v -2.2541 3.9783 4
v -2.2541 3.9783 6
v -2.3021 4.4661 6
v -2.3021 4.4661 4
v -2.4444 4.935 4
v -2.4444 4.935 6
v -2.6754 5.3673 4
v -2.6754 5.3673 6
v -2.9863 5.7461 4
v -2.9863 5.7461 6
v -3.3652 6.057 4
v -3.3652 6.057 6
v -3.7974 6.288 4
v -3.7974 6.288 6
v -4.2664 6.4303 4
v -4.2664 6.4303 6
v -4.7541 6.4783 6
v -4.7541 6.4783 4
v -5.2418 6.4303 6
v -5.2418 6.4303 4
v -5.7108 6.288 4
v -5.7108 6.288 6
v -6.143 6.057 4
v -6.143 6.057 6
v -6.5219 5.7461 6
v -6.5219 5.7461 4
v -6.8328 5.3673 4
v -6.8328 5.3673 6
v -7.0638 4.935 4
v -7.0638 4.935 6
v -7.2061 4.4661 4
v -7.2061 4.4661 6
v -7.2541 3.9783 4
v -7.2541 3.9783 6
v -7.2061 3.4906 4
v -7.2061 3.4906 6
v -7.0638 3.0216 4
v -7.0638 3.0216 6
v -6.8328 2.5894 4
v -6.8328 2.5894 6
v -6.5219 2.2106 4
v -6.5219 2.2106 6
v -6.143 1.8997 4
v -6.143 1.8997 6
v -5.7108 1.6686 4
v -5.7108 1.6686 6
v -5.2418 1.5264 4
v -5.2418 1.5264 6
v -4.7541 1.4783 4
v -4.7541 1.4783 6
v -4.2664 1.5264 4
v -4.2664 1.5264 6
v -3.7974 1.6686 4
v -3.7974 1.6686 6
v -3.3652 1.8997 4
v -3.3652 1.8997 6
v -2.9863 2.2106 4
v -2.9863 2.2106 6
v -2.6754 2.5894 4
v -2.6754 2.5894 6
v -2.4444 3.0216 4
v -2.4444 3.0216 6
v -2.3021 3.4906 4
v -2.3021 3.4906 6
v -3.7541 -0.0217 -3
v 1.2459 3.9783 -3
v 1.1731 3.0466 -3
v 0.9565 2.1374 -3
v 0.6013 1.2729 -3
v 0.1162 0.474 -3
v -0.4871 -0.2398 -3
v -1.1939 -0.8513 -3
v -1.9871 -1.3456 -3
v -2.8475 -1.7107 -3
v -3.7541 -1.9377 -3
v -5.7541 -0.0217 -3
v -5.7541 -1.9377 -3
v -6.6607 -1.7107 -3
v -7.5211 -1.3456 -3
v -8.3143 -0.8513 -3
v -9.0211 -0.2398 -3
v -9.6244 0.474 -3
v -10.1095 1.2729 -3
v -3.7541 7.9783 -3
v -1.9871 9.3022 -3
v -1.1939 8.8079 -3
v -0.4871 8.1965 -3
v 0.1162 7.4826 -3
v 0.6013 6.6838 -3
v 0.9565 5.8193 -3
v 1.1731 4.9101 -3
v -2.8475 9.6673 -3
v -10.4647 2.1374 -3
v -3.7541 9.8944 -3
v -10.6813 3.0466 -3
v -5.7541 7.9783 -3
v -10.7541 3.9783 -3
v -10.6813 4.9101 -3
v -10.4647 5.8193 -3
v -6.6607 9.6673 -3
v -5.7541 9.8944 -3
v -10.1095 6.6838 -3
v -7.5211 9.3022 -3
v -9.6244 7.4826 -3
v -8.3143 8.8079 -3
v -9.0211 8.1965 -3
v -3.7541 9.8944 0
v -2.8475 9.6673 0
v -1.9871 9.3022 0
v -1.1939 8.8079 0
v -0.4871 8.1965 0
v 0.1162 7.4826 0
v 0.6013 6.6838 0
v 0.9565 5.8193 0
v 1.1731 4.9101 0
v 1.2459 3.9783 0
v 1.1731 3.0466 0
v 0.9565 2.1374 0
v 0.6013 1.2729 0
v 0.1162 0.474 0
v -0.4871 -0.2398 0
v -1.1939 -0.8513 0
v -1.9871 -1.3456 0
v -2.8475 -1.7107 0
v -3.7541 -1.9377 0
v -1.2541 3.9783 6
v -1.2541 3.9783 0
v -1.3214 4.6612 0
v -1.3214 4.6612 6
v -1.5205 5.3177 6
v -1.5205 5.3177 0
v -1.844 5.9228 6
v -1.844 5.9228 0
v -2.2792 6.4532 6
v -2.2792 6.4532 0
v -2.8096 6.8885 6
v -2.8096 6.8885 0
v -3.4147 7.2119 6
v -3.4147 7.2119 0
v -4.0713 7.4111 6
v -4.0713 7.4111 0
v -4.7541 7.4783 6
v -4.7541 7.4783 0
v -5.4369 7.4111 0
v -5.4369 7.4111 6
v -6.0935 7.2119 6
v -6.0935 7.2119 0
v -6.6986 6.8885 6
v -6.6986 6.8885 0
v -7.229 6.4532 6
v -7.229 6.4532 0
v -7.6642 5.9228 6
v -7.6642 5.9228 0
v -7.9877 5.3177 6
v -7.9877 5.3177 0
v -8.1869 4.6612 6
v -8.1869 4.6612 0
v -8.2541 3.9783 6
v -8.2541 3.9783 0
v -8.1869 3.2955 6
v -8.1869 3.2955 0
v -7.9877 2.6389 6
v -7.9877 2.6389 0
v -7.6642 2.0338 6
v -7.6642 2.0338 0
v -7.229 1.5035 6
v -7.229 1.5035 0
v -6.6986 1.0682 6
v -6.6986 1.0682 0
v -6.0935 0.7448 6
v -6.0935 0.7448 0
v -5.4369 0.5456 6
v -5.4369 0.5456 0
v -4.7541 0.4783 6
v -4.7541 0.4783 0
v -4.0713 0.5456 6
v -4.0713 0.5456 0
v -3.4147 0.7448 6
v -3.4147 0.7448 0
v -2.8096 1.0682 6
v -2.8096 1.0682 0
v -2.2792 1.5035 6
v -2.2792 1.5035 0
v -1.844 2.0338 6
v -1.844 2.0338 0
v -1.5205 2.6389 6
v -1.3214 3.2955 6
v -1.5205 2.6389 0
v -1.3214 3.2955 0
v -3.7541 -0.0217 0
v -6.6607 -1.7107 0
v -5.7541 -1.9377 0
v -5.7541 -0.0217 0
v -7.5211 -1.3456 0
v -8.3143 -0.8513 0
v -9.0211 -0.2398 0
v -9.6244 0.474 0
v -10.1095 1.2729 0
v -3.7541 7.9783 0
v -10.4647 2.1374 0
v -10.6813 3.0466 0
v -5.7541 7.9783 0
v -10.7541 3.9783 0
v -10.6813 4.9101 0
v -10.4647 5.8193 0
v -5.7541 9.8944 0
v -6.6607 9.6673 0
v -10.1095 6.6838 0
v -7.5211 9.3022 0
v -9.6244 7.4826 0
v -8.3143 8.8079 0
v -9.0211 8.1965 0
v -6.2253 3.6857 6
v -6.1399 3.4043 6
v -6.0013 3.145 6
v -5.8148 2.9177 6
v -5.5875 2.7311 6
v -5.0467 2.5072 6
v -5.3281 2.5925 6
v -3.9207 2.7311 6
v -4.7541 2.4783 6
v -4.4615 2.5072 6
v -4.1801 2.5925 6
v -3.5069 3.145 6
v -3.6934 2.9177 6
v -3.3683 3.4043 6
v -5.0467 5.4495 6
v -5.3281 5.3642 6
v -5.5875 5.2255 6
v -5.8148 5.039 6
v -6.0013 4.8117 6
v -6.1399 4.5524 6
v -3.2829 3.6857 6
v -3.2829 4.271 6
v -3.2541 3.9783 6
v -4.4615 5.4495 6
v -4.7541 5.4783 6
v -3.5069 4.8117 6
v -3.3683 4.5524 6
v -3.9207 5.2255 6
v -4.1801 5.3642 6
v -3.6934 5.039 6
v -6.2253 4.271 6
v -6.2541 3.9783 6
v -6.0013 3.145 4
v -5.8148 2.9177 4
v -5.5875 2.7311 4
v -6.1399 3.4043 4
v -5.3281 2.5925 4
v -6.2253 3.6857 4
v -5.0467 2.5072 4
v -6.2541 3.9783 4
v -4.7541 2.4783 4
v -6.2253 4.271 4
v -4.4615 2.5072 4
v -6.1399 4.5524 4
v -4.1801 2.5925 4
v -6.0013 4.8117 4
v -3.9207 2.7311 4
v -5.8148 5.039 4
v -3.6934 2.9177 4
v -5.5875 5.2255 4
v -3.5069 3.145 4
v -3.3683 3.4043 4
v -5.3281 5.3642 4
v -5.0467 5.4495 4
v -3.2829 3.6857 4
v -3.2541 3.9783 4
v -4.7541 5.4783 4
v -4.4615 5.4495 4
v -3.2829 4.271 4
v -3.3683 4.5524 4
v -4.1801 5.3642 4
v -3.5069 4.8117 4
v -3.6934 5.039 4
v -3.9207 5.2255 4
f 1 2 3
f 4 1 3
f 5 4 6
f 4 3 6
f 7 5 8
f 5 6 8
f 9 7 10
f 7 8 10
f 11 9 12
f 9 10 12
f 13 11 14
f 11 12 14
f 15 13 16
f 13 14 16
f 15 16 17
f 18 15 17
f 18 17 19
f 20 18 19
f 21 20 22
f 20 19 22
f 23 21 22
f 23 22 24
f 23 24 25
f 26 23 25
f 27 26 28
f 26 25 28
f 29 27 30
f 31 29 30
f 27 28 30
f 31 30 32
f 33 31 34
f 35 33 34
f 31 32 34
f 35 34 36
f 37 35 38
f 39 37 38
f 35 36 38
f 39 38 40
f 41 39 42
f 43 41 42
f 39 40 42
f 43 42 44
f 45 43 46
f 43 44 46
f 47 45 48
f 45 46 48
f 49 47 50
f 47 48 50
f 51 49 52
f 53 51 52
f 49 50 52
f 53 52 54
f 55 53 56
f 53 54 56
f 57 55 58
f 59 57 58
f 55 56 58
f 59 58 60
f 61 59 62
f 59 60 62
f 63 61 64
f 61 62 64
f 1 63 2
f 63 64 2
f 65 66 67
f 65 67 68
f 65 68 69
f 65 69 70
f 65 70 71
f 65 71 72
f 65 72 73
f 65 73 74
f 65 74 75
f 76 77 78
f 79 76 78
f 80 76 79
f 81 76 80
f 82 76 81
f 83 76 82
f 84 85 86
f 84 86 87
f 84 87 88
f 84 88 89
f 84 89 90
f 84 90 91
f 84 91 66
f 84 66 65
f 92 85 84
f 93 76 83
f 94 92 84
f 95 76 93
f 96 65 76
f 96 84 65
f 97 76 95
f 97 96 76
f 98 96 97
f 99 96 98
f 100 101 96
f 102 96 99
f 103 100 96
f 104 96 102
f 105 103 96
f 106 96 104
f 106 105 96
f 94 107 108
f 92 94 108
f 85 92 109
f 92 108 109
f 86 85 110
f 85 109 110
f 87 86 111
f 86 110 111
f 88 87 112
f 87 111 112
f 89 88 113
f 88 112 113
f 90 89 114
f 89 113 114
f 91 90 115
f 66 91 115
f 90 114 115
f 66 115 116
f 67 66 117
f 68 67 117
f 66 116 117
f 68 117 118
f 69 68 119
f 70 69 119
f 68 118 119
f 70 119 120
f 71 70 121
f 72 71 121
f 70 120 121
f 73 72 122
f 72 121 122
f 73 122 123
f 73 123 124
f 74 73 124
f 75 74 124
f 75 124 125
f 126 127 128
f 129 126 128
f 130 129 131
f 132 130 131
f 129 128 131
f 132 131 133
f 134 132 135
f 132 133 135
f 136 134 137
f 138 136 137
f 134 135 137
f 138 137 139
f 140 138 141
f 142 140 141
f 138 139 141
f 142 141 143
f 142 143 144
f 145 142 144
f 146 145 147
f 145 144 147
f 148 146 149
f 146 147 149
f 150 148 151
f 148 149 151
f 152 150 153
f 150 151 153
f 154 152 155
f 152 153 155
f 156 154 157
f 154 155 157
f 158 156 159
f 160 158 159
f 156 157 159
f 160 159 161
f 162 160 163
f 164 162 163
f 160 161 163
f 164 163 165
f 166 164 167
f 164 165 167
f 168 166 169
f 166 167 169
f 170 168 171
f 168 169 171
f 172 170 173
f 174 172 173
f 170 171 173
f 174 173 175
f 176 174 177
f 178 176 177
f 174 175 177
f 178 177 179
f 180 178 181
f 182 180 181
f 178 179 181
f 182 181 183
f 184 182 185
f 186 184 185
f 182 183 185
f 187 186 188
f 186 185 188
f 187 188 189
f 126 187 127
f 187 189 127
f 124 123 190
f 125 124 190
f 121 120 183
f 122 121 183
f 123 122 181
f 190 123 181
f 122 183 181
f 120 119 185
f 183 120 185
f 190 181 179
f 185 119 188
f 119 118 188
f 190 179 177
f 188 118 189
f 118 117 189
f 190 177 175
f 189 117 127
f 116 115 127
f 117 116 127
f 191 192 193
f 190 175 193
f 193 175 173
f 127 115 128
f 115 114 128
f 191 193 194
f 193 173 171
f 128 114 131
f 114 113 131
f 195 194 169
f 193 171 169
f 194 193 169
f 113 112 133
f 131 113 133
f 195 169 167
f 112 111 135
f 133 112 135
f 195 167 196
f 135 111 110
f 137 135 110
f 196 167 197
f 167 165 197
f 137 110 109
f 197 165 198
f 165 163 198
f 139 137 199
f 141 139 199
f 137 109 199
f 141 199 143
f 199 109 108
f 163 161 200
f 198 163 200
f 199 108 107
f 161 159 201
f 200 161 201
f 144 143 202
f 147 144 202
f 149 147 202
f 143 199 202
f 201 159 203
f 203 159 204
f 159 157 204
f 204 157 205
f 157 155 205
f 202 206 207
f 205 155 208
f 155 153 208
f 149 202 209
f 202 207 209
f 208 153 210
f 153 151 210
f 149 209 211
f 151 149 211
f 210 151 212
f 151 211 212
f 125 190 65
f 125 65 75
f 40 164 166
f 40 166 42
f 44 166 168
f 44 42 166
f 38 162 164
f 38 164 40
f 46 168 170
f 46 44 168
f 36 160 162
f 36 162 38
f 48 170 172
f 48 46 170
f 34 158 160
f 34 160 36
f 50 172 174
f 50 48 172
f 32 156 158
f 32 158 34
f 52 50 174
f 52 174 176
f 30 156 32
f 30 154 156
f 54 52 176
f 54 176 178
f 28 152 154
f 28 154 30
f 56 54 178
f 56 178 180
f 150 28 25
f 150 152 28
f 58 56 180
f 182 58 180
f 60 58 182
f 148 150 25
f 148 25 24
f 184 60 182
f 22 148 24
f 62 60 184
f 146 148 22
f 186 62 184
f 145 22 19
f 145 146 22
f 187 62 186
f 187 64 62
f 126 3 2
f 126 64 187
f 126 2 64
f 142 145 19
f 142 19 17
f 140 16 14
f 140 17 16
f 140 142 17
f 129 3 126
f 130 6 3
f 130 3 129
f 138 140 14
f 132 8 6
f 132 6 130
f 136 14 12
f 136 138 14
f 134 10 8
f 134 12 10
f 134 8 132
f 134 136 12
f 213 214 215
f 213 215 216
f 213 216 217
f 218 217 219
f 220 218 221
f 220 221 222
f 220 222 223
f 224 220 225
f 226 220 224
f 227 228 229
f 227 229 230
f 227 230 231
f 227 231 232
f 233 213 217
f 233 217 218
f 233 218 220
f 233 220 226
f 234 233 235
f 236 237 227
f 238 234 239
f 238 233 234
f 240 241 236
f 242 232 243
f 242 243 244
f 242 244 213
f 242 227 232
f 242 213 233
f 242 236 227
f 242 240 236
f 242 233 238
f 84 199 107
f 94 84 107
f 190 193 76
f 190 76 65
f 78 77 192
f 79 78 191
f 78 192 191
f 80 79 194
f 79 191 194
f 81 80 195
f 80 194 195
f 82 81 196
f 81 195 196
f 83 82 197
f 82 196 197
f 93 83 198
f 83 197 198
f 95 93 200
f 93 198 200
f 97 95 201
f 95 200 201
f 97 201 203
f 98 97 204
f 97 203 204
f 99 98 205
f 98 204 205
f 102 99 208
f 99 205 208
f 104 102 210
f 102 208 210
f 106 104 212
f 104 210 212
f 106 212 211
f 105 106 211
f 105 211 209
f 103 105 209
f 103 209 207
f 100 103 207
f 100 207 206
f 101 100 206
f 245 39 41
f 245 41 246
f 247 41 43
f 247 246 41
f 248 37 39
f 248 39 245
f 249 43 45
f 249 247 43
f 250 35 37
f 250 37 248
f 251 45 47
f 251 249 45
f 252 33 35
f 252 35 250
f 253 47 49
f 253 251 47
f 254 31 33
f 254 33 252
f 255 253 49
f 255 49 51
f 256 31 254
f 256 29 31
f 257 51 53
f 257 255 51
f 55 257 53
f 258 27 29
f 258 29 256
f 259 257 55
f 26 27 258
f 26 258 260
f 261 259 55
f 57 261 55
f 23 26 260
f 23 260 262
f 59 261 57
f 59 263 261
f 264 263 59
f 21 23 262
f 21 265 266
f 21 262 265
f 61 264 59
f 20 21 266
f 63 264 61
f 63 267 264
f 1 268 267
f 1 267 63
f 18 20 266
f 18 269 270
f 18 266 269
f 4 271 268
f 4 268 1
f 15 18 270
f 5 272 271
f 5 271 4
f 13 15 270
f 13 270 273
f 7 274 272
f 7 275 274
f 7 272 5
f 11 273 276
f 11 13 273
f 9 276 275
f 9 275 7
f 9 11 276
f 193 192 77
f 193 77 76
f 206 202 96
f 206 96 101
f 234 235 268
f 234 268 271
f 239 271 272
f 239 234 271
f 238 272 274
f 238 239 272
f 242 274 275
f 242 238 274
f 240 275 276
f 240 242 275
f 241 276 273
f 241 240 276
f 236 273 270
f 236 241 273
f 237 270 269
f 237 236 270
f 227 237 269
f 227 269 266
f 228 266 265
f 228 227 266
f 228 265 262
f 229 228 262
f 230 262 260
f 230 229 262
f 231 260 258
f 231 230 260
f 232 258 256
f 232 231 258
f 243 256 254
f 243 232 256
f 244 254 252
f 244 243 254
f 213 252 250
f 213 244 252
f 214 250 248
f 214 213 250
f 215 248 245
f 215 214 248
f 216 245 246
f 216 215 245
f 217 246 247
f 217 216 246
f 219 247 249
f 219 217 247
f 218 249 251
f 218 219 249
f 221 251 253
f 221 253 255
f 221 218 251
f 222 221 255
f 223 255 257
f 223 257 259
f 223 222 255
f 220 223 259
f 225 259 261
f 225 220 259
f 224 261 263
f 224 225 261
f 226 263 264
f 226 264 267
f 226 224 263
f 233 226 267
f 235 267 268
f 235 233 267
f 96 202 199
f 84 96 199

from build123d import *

# Parameters (mm, degrees)
CROQUIS1_R              = 3.5
SALIENTE_EXTRUIR1_DEPTH = 6
CROQUIS2_R              = 6
SALIENTE_EXTRUIR2_DEPTH = 3
CROQUIS3_R              = 2.5
CROQUIS3_R_2            = 1.5
CORTAR_EXTRUIR1_DEPTH   = 2
CROQUIS4_W              = 2
CROQUIS4_H              = 2
CORTAR_EXTRUIR2_DEPTH   = 4


with BuildPart() as part:
    # Croquis1 → Saliente-Extruir1 (new body)
    with BuildSketch(Plane.XY):
        with Locations((-4.754102012, 3.97833761)):
            Circle(CROQUIS1_R)
    extrude(amount=SALIENTE_EXTRUIR1_DEPTH)

    # Croquis2 → Saliente-Extruir2 (add)
    with BuildSketch(Plane(origin=(0, 0, 0), x_dir=(-1, 0, 0), z_dir=(0, 0, -1))):
        with Locations((4.754102012, 3.97833761)):
            Circle(CROQUIS2_R)
    extrude(amount=SALIENTE_EXTRUIR2_DEPTH)

    # Croquis3 → Cortar-Extruir1 (cut)
    with BuildSketch(Plane.XY.offset(6)):
        with Locations((-4.754102012, 3.97833761)):
            Circle(CROQUIS3_R)
        with Locations((-4.754102012, 3.97833761)):
            Circle(CROQUIS3_R_2, mode=Mode.SUBTRACT)
    extrude(amount=-CORTAR_EXTRUIR1_DEPTH, mode=Mode.SUBTRACT)

    # Croquis4 → Cortar-Extruir2 (cut, through all)
    with BuildSketch(Plane.XY):
        with Locations((-4.754102012, 8.97833761)):
            Rectangle(CROQUIS4_W, CROQUIS4_H)
        Polygon((-5.754102012, -0.02166239), (-3.754102012, -0.02166239), (-3.754102012, -2.02166239), (-4.754102012, -2.02166239), (-5.754102012, -2.02166239), align=None)
    extrude(amount=-CORTAR_EXTRUIR2_DEPTH, mode=Mode.SUBTRACT)


solid = part.part
